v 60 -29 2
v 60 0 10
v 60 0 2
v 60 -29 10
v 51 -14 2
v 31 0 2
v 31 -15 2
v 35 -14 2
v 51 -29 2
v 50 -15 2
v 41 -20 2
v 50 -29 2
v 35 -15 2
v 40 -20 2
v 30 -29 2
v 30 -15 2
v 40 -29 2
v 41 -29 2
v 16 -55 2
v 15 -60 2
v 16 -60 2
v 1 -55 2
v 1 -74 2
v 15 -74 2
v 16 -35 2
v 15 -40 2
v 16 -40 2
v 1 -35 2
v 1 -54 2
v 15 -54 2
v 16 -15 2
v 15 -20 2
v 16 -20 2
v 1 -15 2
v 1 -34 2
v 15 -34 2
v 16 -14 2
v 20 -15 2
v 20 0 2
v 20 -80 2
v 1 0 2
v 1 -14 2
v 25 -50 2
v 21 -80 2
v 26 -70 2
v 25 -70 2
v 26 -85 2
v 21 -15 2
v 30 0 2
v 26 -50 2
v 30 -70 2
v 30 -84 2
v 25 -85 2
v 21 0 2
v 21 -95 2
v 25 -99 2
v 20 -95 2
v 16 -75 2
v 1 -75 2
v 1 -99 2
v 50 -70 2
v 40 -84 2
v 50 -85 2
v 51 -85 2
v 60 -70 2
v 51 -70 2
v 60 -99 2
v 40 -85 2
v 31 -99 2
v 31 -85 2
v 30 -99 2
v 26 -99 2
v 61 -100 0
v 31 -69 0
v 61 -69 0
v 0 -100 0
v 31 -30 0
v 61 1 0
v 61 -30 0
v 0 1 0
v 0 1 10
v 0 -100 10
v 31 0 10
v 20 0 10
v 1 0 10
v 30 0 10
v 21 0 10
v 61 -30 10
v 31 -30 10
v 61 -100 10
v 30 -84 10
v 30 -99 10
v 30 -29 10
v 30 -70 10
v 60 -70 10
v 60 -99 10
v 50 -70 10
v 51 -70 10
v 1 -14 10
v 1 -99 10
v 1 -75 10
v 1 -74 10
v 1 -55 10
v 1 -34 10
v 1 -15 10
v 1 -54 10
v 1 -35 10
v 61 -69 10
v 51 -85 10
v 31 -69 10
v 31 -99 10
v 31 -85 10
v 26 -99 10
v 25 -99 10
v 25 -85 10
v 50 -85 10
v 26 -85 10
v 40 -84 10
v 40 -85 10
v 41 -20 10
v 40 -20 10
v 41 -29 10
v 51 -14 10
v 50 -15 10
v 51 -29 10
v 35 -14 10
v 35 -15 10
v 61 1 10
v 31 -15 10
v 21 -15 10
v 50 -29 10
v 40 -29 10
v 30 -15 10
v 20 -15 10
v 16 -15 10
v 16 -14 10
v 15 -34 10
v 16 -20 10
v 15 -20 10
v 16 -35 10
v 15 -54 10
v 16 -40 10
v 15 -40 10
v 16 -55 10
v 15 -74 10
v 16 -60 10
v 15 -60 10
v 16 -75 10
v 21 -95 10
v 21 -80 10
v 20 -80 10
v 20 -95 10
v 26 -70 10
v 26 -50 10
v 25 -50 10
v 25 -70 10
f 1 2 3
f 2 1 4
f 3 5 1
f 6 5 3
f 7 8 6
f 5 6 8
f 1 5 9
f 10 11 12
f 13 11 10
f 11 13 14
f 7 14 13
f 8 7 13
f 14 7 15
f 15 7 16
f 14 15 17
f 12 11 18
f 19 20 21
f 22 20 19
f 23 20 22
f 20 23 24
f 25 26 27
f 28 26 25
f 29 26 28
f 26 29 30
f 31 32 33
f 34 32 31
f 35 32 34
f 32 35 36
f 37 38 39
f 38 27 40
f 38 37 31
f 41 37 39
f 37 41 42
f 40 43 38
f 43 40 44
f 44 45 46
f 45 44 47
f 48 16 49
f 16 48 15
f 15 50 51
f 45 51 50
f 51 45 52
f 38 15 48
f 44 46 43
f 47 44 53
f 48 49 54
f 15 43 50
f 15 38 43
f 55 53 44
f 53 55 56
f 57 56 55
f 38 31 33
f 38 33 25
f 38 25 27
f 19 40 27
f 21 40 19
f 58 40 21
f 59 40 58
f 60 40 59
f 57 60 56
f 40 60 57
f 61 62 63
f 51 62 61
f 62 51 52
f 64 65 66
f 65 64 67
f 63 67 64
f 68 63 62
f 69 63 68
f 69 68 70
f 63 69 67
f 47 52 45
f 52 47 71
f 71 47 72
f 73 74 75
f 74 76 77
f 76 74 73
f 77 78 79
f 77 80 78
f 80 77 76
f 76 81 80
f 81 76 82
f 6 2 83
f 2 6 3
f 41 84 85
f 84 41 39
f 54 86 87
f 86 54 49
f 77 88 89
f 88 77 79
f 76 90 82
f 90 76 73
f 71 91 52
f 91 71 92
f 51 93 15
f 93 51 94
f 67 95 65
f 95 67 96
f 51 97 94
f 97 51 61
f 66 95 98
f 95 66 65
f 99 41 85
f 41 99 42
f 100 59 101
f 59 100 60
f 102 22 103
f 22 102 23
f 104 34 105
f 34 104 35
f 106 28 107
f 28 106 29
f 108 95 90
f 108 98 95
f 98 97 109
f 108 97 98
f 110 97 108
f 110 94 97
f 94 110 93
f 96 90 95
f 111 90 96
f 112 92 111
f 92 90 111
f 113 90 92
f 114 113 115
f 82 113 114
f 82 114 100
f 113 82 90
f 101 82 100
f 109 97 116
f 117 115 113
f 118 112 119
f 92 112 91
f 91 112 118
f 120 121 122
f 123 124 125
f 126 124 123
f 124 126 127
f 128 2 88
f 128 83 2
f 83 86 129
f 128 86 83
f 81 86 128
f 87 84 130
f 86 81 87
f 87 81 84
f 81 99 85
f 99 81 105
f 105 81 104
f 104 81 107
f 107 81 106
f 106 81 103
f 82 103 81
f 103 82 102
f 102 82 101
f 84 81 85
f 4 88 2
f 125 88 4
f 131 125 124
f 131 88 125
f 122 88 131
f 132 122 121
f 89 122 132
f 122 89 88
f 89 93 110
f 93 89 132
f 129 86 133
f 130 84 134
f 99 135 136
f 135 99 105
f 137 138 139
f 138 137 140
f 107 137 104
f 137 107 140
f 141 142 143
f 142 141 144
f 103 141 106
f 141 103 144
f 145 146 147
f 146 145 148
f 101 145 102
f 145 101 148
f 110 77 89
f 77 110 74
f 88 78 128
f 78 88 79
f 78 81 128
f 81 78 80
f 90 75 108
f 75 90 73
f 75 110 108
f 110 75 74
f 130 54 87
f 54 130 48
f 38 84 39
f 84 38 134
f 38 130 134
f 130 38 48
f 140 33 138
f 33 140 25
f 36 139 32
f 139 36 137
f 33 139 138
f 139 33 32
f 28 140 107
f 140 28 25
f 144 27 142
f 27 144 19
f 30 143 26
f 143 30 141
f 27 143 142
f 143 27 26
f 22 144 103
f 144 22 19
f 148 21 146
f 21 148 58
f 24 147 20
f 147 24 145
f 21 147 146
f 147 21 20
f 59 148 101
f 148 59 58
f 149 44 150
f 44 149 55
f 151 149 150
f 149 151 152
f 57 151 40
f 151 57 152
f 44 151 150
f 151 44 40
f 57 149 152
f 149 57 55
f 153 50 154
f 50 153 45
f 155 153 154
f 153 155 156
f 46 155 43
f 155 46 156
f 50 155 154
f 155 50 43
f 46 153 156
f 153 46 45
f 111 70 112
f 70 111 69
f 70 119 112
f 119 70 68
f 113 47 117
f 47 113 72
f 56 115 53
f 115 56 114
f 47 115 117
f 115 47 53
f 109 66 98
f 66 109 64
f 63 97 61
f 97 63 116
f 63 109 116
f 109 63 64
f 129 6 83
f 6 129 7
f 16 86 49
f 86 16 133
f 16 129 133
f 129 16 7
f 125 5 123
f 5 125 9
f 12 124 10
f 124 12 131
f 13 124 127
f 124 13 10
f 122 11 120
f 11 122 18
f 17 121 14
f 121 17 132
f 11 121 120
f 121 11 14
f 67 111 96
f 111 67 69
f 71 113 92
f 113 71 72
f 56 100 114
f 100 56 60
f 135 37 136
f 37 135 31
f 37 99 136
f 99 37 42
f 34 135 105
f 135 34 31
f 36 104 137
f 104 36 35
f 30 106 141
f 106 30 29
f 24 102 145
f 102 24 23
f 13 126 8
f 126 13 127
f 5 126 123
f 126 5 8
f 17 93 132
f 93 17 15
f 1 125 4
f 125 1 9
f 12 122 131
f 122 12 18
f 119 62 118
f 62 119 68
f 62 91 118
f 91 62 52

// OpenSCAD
//4 этаж

{translate([0,-30,0])
cube([60,30,2]);
translate([0,0,0])
rotate([0,0,270])
cube([100,30,2]);
translate([0,-100,0])
cube([60,30,2]);
}
{
translate([0,-100,0])
cube([1,100,10]);
translate([30,-70,0])
cube([1,40,10]);
translate([60,-30,0])
cube([1,31,10]);
translate([60,-100,0])
cube([1,31,10]);
translate([20,-15,0])
cube([1,15,10]);
translate([15,-35,0])
cube([1,15,10]);
translate([15,-55,0])
cube([1,15,10]);
translate([15,-75,0])
cube([1,15,10]);
translate([20,-95,0])
cube([1,15,10]);
translate([25,-70,0])
cube([1,20,10]);
translate([30,-100,0])
cube([1,15,10]);
translate([25,-100,0])
cube([1,15,10]);
translate([50,-85,0])
cube([1,15,10]);
translate([30,-15,0])
cube([1,15,10]);
translate([50,-30,0])
cube([1,15,10]);
translate([40,-30,0])
cube([1,10,10]);
}
{
translate([0,0,0])
cube([60,1,10]);
translate([0,-100,0])
cube([60,1,10]);
translate([0,-15,0])
cube([16,1,10]);
translate([0,-35,0])
cube([16,1,10]);
translate([0,-55,0])
cube([16,1,10]);
translate([0,-75,0])
cube([16,1,10]);
translate([35,-15,0])
cube([16,1,10]);
translate([30,-30,0])
cube([30,1,10]);
translate([30,-70,0])
cube([30,1,10]);
translate([30,-85,0])
cube([10,1,10]);



}
